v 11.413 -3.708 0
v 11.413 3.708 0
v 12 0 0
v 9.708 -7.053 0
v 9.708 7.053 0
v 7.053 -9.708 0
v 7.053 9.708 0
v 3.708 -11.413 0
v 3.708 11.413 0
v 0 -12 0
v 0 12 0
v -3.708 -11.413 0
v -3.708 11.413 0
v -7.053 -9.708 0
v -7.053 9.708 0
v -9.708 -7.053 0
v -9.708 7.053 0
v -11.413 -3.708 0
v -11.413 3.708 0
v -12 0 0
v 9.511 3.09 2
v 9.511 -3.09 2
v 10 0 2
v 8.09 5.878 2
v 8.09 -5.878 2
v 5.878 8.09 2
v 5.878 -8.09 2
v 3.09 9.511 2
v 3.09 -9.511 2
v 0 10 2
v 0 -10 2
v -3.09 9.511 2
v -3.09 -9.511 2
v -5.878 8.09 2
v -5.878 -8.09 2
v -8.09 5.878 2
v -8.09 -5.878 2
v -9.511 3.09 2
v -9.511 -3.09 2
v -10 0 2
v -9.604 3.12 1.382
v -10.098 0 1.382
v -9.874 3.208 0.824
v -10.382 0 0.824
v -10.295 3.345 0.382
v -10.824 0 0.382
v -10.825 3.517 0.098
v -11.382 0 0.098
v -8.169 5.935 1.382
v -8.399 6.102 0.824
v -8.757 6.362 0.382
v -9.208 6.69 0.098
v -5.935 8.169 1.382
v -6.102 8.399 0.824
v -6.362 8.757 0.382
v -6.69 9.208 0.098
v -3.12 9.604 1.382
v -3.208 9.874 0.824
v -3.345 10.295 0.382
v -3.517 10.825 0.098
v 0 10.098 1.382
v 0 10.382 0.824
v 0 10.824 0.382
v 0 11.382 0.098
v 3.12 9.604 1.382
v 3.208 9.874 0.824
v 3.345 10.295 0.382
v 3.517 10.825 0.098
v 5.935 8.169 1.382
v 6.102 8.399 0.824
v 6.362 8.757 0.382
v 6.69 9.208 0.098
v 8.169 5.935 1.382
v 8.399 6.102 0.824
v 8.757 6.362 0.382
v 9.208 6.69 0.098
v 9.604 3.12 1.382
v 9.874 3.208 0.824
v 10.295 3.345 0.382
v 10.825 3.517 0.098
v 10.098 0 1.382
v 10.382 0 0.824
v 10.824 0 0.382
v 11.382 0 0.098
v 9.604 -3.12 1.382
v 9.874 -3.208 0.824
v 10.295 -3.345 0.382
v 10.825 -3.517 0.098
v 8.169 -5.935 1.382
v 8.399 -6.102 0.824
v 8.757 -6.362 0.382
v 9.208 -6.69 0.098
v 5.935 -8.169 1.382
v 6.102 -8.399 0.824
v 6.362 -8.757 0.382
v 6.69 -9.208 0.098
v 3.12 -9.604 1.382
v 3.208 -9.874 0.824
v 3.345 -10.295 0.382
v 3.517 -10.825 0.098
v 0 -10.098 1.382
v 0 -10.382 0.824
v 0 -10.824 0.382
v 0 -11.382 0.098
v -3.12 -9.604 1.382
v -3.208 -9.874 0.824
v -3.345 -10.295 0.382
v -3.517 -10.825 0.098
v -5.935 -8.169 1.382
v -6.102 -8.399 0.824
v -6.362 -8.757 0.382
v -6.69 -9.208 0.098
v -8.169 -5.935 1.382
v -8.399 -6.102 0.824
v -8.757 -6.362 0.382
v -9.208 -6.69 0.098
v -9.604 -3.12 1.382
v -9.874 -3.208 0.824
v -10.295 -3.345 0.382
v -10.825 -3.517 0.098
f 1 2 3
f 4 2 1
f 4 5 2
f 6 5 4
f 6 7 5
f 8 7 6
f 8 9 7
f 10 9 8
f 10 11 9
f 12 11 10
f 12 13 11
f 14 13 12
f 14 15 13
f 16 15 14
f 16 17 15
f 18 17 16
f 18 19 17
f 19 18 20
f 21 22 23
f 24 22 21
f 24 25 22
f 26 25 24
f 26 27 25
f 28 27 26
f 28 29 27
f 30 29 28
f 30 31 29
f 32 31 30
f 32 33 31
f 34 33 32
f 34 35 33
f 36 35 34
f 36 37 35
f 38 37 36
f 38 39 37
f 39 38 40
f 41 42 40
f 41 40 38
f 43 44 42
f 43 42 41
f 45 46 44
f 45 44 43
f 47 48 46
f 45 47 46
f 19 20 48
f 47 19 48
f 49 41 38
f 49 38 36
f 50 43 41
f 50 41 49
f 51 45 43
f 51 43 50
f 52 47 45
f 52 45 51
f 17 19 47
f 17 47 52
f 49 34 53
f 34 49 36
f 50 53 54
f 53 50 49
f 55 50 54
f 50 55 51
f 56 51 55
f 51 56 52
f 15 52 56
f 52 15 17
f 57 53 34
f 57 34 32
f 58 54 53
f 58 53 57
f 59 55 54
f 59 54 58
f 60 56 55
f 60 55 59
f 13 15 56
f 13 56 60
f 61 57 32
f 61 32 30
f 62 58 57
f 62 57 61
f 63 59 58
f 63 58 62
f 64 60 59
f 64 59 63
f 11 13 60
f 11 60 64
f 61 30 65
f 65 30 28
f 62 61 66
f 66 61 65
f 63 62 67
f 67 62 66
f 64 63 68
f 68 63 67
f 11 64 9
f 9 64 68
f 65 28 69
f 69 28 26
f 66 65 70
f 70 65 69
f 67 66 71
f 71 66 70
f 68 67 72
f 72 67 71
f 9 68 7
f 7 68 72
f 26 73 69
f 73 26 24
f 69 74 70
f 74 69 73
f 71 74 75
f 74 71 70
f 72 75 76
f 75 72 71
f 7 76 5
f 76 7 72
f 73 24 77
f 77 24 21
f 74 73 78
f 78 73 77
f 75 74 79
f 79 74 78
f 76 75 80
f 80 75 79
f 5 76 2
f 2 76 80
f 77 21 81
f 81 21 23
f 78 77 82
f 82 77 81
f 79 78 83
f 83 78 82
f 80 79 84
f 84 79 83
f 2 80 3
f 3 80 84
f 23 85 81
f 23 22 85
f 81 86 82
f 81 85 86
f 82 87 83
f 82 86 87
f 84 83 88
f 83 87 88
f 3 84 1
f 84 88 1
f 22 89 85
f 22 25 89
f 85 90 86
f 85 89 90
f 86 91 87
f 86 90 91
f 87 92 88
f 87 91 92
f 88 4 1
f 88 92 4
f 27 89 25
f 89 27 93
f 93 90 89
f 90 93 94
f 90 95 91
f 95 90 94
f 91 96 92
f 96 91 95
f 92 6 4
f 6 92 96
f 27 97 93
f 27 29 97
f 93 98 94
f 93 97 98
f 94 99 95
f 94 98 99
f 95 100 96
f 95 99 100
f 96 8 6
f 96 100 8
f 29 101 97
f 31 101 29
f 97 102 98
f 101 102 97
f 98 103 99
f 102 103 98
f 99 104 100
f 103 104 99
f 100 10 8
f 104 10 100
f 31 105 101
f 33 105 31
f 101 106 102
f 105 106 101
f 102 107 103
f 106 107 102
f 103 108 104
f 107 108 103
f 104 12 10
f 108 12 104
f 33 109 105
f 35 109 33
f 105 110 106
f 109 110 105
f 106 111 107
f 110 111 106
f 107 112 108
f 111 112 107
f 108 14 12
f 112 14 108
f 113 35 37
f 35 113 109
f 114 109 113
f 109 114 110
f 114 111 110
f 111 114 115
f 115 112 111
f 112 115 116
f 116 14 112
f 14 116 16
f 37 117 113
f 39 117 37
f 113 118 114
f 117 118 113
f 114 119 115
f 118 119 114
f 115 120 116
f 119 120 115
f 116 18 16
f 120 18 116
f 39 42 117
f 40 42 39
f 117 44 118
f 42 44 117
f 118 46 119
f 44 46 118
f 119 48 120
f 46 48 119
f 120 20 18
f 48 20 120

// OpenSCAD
fillet_around_cylinder_base(10, 2, false);

module fillet_around_cylinder_base(r1, r2, remove_core){
    // r1 is radius of the cylinder whose base needs a fillet around it.
    // r2 is the radius of that fillet.
    $fn=20;
    difference() {
        cylinder(r=r1 + r2, h=r2);
        union() {
            translate([0,0,r2])
                rotate_extrude(convexity = 10)
                    translate([r1 + r2, 0, 0])
                        circle(r = r2);
            if (remove_core==true) {
                cylinder(r=r1, h=r2);
            }
        }
    }
}
